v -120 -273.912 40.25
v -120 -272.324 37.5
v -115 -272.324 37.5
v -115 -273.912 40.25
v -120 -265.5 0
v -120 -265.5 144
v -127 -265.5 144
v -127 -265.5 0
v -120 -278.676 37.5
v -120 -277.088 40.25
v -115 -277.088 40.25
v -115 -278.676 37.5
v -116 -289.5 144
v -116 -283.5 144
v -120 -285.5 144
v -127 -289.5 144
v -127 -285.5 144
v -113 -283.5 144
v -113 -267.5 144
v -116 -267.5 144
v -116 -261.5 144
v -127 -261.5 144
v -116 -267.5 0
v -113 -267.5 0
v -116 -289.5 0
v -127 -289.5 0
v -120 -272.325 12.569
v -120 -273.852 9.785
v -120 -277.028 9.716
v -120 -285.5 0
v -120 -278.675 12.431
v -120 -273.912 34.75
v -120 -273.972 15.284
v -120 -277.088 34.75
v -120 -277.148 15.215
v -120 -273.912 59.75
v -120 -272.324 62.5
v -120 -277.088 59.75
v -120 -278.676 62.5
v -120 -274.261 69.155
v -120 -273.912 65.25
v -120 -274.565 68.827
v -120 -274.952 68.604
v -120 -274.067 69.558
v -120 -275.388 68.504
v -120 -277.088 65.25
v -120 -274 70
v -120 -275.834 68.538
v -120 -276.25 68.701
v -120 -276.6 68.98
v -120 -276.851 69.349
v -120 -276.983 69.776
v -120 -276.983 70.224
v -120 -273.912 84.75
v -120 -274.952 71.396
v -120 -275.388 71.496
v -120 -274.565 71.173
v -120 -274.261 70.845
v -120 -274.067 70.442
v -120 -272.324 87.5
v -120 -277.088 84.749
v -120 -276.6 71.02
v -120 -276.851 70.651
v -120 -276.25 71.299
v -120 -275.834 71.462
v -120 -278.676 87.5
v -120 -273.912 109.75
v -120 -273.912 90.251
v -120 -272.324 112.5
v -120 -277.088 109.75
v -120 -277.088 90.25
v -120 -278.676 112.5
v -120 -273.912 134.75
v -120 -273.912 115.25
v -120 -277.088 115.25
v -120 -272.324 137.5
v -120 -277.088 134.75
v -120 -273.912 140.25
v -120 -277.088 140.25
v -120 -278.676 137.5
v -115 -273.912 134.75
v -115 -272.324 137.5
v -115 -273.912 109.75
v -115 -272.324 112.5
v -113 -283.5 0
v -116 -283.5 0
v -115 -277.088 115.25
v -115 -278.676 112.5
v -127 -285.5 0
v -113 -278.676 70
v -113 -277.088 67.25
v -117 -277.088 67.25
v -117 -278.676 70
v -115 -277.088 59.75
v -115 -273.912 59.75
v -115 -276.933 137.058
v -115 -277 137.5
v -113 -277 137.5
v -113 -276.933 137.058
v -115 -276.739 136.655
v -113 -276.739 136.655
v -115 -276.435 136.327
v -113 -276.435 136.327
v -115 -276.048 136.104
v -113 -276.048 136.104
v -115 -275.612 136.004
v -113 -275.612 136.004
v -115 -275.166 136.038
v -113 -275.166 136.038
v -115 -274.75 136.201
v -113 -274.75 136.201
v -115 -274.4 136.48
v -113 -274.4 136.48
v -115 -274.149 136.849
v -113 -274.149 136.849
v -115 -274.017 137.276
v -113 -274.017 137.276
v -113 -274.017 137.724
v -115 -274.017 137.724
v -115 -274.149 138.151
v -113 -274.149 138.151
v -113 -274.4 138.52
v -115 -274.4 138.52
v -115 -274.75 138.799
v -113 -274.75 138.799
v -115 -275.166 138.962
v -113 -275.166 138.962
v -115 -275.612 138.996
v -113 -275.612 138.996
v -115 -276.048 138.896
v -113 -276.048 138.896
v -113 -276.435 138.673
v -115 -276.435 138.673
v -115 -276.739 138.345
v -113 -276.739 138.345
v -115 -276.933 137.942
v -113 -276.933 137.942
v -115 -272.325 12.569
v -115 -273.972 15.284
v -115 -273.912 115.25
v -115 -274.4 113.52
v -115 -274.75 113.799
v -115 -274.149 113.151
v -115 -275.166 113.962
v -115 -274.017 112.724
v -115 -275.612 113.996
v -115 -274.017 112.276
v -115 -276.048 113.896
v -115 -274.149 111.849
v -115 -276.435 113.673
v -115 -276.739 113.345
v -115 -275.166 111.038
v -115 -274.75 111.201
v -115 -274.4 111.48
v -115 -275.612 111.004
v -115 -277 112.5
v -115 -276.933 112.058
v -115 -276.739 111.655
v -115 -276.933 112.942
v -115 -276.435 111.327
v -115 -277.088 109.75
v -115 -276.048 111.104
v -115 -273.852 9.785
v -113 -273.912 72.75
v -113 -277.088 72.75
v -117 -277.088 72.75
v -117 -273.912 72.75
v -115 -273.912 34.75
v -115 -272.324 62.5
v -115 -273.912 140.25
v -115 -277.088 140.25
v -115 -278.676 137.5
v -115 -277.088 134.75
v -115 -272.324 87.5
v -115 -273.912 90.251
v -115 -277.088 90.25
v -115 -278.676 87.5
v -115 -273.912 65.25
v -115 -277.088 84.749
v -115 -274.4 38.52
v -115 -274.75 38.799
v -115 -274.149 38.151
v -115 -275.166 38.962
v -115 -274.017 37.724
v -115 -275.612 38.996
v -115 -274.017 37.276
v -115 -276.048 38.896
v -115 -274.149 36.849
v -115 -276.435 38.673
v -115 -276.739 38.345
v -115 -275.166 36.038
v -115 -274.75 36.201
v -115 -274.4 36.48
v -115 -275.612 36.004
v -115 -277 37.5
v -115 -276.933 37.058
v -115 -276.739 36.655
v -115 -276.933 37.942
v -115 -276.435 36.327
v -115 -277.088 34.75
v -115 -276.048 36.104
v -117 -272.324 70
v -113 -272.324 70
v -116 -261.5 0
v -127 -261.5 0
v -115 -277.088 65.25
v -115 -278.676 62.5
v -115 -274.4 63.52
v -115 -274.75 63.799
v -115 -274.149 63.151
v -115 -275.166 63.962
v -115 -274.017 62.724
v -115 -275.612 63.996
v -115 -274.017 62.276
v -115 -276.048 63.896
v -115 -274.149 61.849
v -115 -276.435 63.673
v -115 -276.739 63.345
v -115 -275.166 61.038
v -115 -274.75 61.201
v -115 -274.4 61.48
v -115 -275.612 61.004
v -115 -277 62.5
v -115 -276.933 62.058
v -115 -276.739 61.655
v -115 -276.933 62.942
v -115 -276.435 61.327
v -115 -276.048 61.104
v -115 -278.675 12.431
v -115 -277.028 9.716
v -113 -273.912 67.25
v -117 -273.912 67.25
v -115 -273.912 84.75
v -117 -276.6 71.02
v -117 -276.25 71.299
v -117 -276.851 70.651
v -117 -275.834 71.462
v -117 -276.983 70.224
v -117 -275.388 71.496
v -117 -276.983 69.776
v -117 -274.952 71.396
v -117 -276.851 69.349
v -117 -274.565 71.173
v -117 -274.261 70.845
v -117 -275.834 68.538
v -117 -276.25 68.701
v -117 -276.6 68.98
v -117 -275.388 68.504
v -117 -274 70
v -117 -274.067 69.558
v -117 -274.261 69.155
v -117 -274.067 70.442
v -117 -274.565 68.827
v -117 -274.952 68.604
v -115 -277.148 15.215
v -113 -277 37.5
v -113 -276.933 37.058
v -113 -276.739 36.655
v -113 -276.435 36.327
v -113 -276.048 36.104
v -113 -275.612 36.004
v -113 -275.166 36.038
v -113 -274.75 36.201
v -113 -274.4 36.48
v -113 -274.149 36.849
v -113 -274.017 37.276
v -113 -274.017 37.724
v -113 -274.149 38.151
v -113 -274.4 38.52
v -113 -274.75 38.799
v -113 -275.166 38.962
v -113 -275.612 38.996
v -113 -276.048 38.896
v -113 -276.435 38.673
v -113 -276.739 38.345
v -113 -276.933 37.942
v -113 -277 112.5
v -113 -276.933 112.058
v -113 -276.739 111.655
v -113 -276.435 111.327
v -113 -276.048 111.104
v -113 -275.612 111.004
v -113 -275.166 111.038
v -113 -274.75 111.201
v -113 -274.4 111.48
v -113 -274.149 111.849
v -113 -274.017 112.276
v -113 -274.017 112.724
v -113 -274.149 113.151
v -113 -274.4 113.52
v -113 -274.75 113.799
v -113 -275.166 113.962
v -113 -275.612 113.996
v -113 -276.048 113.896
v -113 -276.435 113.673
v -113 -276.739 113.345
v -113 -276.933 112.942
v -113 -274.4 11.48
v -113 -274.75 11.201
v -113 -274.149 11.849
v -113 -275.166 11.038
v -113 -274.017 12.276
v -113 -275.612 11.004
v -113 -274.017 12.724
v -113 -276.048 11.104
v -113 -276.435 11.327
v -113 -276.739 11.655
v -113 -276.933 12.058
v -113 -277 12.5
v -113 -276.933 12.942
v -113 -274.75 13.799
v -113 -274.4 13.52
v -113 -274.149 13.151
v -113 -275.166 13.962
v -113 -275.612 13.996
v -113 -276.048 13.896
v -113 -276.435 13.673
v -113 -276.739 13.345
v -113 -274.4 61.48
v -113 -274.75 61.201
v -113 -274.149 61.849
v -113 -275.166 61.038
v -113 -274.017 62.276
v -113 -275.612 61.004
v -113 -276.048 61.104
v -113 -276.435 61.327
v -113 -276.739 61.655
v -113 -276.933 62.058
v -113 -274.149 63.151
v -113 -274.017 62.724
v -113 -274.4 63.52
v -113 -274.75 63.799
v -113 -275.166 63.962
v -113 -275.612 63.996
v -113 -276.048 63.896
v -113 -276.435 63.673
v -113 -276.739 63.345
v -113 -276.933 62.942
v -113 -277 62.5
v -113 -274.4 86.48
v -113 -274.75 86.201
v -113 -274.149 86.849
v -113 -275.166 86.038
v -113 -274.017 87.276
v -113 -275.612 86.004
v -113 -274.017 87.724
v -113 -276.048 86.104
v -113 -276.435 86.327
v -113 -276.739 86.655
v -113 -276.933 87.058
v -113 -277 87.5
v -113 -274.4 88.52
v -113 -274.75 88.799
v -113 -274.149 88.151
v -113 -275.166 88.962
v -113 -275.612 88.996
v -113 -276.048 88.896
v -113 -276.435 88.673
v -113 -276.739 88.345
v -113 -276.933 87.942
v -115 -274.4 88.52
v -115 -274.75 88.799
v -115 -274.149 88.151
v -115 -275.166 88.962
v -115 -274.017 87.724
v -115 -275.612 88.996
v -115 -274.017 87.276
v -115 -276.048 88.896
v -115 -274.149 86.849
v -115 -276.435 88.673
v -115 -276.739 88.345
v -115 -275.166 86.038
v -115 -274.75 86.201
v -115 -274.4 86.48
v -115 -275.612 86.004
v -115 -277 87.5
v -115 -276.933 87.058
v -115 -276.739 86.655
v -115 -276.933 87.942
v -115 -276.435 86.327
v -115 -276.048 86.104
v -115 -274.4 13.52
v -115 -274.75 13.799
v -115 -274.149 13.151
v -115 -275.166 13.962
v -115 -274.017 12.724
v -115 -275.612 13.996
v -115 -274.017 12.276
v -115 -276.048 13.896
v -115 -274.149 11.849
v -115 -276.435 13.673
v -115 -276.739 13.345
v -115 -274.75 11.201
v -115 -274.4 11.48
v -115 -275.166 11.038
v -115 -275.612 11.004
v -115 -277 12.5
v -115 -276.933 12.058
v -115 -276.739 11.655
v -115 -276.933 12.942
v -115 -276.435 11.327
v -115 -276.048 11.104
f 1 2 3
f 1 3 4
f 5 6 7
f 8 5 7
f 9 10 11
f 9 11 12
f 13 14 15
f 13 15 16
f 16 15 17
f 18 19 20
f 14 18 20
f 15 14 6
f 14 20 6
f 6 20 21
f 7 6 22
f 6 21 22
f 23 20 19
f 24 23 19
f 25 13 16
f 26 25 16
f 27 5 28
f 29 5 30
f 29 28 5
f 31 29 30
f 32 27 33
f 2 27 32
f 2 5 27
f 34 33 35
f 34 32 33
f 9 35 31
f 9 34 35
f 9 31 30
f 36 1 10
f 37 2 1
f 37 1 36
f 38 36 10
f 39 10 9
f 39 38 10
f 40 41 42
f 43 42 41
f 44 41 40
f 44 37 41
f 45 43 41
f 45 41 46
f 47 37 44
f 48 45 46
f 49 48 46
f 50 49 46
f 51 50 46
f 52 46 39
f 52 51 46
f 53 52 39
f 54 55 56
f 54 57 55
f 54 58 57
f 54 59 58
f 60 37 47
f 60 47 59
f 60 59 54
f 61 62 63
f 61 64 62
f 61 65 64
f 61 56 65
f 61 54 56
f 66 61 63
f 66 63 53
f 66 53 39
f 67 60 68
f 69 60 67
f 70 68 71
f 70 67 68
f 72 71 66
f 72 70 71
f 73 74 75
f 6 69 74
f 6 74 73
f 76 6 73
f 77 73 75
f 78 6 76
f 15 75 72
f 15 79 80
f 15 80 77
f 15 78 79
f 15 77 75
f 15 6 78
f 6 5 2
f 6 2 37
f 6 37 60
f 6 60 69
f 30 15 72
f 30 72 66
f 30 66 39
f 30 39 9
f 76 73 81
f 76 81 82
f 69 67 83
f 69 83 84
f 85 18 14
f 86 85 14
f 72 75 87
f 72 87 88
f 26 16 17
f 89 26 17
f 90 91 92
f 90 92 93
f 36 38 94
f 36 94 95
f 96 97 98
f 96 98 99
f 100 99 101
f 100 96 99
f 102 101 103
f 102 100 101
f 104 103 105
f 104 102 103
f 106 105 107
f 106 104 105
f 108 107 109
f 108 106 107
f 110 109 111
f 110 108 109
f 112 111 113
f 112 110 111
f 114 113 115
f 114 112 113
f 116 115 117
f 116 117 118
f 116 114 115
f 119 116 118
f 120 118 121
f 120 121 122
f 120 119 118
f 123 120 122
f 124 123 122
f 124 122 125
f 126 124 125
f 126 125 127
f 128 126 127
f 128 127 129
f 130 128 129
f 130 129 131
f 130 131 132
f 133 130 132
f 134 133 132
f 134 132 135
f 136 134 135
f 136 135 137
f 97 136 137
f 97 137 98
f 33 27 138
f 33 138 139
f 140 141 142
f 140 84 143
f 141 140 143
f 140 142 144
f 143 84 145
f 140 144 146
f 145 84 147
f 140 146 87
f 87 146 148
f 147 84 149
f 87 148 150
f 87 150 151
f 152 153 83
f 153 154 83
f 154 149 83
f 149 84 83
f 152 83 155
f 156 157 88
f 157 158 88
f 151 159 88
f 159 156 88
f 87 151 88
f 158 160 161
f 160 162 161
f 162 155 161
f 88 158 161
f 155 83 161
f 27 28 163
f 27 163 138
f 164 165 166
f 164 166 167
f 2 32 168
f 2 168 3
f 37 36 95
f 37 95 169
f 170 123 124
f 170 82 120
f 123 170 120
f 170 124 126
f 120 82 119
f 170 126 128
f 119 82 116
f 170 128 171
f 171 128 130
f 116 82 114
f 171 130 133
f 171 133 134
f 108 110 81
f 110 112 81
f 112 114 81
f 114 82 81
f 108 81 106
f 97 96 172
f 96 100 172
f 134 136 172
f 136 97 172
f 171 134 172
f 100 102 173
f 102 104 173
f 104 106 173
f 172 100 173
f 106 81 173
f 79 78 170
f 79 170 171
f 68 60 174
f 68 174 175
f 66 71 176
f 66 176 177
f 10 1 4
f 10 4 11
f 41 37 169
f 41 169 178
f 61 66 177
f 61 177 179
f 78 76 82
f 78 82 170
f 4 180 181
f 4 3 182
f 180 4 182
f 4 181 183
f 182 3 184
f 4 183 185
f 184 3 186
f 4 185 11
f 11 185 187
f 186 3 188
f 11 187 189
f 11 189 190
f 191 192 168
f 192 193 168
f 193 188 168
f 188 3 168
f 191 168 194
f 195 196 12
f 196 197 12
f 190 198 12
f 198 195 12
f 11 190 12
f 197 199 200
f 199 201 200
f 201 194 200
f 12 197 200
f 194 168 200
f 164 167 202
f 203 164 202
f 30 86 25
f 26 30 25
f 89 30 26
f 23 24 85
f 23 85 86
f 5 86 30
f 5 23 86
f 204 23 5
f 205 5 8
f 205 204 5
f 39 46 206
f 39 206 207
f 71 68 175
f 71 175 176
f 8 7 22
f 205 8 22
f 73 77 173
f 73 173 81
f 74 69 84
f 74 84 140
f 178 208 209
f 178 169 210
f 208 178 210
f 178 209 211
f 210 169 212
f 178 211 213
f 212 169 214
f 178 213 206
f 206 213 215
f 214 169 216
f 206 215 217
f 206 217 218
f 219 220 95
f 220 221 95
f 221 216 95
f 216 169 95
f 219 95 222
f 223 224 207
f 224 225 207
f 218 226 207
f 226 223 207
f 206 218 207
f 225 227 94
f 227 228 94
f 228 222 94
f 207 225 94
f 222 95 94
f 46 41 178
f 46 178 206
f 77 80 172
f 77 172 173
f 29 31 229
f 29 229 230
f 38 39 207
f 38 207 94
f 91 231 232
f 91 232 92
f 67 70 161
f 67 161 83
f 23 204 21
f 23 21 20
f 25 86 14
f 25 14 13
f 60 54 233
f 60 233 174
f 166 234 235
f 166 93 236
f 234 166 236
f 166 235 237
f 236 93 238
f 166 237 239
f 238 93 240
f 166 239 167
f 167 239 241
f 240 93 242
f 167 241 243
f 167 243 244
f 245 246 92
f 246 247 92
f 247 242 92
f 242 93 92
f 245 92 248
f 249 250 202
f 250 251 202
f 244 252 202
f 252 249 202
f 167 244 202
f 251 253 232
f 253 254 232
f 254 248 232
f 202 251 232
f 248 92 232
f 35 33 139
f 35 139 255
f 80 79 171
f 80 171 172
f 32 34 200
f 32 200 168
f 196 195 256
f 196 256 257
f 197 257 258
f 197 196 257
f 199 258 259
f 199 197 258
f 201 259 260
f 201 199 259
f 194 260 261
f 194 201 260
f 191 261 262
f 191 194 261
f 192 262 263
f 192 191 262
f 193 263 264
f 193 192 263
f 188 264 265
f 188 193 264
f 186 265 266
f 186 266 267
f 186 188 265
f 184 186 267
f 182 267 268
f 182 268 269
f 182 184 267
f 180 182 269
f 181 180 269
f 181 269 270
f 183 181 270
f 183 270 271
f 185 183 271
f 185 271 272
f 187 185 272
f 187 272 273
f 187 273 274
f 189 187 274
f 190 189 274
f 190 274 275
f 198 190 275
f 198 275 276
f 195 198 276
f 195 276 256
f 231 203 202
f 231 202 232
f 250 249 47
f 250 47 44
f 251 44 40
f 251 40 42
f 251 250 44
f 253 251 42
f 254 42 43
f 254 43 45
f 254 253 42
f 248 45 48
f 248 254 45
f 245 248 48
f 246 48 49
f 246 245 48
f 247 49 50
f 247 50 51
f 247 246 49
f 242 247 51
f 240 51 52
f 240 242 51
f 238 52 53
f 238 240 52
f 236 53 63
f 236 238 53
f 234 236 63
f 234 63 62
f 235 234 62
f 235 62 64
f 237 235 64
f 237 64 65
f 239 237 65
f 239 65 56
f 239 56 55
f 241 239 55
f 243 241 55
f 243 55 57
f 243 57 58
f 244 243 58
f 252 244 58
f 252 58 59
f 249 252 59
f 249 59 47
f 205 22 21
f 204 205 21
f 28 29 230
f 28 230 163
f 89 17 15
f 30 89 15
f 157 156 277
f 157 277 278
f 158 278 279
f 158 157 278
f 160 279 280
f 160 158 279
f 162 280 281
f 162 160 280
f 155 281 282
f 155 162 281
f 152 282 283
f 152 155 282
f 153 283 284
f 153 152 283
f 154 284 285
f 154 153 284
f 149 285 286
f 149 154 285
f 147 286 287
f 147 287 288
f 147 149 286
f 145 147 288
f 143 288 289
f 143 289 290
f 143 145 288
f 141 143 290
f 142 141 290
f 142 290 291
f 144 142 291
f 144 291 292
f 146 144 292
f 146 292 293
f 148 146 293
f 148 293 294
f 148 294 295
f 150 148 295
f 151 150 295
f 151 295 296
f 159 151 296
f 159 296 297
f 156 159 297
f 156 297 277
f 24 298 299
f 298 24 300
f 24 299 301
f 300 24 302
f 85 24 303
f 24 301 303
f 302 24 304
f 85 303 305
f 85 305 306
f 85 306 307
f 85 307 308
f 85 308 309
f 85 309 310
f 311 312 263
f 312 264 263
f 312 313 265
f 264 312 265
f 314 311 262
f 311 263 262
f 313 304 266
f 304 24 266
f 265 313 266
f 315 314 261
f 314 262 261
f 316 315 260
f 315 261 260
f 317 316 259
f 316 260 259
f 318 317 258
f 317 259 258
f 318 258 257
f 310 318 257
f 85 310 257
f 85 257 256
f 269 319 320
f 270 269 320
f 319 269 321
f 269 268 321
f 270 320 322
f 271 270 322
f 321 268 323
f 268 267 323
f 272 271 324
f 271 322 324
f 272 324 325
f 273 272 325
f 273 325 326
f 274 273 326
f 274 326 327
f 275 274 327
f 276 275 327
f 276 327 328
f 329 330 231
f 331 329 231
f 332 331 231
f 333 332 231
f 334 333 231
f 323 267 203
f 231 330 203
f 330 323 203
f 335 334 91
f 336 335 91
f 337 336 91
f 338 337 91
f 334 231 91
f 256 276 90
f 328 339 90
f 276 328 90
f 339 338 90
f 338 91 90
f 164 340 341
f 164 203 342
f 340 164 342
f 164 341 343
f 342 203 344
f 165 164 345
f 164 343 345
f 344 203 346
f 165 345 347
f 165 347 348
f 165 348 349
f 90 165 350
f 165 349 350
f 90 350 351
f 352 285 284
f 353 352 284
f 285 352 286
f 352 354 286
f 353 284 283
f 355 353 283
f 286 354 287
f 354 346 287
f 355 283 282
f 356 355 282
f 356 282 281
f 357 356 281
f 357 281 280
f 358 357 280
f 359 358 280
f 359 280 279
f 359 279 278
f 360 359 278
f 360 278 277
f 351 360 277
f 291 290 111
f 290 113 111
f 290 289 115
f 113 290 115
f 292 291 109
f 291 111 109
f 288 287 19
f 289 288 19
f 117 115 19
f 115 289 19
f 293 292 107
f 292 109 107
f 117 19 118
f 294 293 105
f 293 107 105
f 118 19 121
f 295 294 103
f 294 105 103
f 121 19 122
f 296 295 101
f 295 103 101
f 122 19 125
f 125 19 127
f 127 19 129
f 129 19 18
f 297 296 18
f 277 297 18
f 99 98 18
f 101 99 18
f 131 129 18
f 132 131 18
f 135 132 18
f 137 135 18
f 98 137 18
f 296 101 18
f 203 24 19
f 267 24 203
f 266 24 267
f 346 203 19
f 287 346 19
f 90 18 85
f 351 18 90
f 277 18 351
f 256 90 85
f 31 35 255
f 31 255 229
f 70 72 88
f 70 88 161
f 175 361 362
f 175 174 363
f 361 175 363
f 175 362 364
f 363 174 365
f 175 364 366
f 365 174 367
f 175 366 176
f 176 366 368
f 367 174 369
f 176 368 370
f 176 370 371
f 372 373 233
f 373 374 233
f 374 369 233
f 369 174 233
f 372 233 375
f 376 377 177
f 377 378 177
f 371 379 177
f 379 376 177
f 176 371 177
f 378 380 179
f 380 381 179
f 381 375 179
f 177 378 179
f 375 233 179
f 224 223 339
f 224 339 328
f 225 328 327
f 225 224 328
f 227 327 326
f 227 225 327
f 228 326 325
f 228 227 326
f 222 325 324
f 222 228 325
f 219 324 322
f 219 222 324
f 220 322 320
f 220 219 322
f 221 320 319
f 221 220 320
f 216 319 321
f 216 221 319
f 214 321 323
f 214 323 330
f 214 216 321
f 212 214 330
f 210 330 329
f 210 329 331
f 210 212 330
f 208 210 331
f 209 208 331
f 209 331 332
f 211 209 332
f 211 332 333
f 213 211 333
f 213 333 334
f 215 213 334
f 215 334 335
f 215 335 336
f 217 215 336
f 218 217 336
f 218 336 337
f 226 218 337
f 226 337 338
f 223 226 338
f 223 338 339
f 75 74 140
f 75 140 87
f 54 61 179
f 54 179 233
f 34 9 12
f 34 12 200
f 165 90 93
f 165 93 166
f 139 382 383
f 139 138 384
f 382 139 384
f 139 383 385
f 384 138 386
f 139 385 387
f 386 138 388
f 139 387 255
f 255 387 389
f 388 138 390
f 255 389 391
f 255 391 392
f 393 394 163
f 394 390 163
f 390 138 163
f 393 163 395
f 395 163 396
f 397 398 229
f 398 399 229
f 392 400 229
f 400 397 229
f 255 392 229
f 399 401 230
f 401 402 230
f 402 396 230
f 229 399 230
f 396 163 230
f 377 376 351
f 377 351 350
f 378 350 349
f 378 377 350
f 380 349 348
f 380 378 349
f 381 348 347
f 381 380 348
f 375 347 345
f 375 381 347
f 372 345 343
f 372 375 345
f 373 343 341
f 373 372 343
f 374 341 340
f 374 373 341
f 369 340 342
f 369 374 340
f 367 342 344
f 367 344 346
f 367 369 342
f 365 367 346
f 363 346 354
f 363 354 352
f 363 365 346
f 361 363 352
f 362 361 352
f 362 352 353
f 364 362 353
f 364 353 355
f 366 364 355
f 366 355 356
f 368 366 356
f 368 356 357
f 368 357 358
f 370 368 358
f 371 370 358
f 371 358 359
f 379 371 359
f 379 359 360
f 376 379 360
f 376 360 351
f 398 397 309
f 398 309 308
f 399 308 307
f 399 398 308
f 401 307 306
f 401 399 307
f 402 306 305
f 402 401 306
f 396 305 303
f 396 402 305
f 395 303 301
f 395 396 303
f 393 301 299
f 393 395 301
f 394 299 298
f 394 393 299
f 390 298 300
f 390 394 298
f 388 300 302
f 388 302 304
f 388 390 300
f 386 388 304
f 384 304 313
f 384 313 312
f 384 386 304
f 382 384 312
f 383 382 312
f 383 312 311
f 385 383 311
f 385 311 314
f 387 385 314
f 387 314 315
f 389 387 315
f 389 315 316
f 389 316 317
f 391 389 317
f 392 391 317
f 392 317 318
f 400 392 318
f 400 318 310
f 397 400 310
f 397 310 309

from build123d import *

# Parameters (mm, degrees)
PAD034_DEPTH            = 144
SKETCH063_R             = 1.5
POCKET027_DEPTH         = 7
POCKET028_DEPTH         = 4
SKETCH067_R             = 1.5
POCKET031_DEPTH         = 7
POCKET032_DEPTH         = 5
BODY019_ROLL_ANGLE      = 90
BODY019_PLACEMENT_ANGLE = 180


with BuildPart() as rightlow:
    # Sketch062 → Pad034 (new body)
    with BuildSketch(Plane.XZ):
        Polygon((0, 0), (0, 10), (-7, 10), (-7, 14), (4, 14), (4, 8), (7, 8), (7, -8), (4, -8), (4, -14), (-7, -14), (-7, -10), (0, -10), align=None)
    extrude(amount=PAD034_DEPTH)

    # Sketch063 (on Face6 of Pad034) → Pocket027 (cut)
    with BuildSketch(Plane(origin=(7, 0, 0), x_dir=(0, 0, 1), z_dir=(1, 0, 0))):
        with Locations((0, 74)):
            Circle(SKETCH063_R)
    extrude(amount=-POCKET027_DEPTH, mode=Mode.SUBTRACT)

    # Sketch064 (on Face11 of Pocket027) → Pocket028 (cut)
    with BuildSketch(Plane(origin=(7, 0, 0), x_dir=(0, 0, 1), z_dir=(1, 0, 0))):
        Polygon((3.176, 74.000007), (1.587994, 76.7505), (-1.588006, 76.750493), (-3.176, 73.999993), (-1.587994, 71.2495), (1.588006, 71.249507), align=None)
    extrude(amount=-POCKET028_DEPTH, mode=Mode.SUBTRACT)

    # Sketch067 (on Face2 of Pocket028) → Pocket031 (cut)
    with BuildSketch(Plane(origin=(0, 0, 0), x_dir=(0, 0, -1), z_dir=(-1, 0, 0))):
        with Locations((0, 131.5)):
            Circle(SKETCH067_R)
        with Locations((0, 106.5)):
            Circle(SKETCH067_R)
        with Locations((0, 56.5)):
            Circle(SKETCH067_R)
        with Locations((0, 31.5)):
            Circle(SKETCH067_R)
        with Locations((0, 6.5)):
            Circle(SKETCH067_R)
        with Locations((0, 81.5)):
            Circle(SKETCH067_R)
    extrude(amount=-POCKET031_DEPTH, mode=Mode.SUBTRACT)

    # Sketch068 → Pocket032 (cut)
    with BuildSketch(Plane(origin=(0, 0, 0), x_dir=(0, 0, -1), z_dir=(-1, 0, 0))):
        Polygon((3.175246, 131.569182), (1.52771, 134.284435), (-1.647536, 134.215253), (-3.175246, 131.430818), (-1.52771, 128.715565), (1.647536, 128.784747), align=None)
        Polygon((3.176, 106.5), (1.588, 109.250497), (-1.588, 109.250497), (-3.176, 106.5), (-1.588, 103.749503), (1.588, 103.749503), align=None)
        Polygon((3.176, 56.50001), (1.587991, 59.250502), (-1.588009, 59.250491), (-3.176, 56.49999), (-1.587991, 53.749498), (1.588009, 53.749509), align=None)
        Polygon((3.176, 31.499996), (1.588004, 34.250495), (-1.587996, 34.250499), (-3.176, 31.500004), (-1.588004, 28.749505), (1.587996, 28.749501), align=None)
        Polygon((3.176, 81.5), (1.588, 84.250497), (-1.588, 84.250497), (-3.176, 81.5), (-1.588, 78.749503), (1.588, 78.749503), align=None)
        Polygon((3.176, 6.5), (1.588, 9.250497), (-1.588, 9.250497), (-3.176, 6.5), (-1.588, 3.749503), (1.588, 3.749503), align=None)
    extrude(amount=-POCKET032_DEPTH, mode=Mode.SUBTRACT)


with BuildPart() as rightlow_1:
    # Body019 roll: moved
    add(rightlow.part.rotate(Axis((0, 0, 0), (1, 0, 0)), BODY019_ROLL_ANGLE))


with BuildPart() as rightlow_2:
    # Body019 placement: moved
    add(rightlow_1.part.moved(Location((120, -275.5, 144))).rotate(Axis((120, -275.5, 144), (0, 0, 1)), BODY019_PLACEMENT_ANGLE))


with BuildPart() as leftlow:
    # Part__Mirroring008: instance of RightLow
    add(rightlow_2.part.mirror(Plane(origin=(0, 0, 0), x_dir=(0, -1, 0), z_dir=(1, 0, 0))))


solid = leftlow.part
